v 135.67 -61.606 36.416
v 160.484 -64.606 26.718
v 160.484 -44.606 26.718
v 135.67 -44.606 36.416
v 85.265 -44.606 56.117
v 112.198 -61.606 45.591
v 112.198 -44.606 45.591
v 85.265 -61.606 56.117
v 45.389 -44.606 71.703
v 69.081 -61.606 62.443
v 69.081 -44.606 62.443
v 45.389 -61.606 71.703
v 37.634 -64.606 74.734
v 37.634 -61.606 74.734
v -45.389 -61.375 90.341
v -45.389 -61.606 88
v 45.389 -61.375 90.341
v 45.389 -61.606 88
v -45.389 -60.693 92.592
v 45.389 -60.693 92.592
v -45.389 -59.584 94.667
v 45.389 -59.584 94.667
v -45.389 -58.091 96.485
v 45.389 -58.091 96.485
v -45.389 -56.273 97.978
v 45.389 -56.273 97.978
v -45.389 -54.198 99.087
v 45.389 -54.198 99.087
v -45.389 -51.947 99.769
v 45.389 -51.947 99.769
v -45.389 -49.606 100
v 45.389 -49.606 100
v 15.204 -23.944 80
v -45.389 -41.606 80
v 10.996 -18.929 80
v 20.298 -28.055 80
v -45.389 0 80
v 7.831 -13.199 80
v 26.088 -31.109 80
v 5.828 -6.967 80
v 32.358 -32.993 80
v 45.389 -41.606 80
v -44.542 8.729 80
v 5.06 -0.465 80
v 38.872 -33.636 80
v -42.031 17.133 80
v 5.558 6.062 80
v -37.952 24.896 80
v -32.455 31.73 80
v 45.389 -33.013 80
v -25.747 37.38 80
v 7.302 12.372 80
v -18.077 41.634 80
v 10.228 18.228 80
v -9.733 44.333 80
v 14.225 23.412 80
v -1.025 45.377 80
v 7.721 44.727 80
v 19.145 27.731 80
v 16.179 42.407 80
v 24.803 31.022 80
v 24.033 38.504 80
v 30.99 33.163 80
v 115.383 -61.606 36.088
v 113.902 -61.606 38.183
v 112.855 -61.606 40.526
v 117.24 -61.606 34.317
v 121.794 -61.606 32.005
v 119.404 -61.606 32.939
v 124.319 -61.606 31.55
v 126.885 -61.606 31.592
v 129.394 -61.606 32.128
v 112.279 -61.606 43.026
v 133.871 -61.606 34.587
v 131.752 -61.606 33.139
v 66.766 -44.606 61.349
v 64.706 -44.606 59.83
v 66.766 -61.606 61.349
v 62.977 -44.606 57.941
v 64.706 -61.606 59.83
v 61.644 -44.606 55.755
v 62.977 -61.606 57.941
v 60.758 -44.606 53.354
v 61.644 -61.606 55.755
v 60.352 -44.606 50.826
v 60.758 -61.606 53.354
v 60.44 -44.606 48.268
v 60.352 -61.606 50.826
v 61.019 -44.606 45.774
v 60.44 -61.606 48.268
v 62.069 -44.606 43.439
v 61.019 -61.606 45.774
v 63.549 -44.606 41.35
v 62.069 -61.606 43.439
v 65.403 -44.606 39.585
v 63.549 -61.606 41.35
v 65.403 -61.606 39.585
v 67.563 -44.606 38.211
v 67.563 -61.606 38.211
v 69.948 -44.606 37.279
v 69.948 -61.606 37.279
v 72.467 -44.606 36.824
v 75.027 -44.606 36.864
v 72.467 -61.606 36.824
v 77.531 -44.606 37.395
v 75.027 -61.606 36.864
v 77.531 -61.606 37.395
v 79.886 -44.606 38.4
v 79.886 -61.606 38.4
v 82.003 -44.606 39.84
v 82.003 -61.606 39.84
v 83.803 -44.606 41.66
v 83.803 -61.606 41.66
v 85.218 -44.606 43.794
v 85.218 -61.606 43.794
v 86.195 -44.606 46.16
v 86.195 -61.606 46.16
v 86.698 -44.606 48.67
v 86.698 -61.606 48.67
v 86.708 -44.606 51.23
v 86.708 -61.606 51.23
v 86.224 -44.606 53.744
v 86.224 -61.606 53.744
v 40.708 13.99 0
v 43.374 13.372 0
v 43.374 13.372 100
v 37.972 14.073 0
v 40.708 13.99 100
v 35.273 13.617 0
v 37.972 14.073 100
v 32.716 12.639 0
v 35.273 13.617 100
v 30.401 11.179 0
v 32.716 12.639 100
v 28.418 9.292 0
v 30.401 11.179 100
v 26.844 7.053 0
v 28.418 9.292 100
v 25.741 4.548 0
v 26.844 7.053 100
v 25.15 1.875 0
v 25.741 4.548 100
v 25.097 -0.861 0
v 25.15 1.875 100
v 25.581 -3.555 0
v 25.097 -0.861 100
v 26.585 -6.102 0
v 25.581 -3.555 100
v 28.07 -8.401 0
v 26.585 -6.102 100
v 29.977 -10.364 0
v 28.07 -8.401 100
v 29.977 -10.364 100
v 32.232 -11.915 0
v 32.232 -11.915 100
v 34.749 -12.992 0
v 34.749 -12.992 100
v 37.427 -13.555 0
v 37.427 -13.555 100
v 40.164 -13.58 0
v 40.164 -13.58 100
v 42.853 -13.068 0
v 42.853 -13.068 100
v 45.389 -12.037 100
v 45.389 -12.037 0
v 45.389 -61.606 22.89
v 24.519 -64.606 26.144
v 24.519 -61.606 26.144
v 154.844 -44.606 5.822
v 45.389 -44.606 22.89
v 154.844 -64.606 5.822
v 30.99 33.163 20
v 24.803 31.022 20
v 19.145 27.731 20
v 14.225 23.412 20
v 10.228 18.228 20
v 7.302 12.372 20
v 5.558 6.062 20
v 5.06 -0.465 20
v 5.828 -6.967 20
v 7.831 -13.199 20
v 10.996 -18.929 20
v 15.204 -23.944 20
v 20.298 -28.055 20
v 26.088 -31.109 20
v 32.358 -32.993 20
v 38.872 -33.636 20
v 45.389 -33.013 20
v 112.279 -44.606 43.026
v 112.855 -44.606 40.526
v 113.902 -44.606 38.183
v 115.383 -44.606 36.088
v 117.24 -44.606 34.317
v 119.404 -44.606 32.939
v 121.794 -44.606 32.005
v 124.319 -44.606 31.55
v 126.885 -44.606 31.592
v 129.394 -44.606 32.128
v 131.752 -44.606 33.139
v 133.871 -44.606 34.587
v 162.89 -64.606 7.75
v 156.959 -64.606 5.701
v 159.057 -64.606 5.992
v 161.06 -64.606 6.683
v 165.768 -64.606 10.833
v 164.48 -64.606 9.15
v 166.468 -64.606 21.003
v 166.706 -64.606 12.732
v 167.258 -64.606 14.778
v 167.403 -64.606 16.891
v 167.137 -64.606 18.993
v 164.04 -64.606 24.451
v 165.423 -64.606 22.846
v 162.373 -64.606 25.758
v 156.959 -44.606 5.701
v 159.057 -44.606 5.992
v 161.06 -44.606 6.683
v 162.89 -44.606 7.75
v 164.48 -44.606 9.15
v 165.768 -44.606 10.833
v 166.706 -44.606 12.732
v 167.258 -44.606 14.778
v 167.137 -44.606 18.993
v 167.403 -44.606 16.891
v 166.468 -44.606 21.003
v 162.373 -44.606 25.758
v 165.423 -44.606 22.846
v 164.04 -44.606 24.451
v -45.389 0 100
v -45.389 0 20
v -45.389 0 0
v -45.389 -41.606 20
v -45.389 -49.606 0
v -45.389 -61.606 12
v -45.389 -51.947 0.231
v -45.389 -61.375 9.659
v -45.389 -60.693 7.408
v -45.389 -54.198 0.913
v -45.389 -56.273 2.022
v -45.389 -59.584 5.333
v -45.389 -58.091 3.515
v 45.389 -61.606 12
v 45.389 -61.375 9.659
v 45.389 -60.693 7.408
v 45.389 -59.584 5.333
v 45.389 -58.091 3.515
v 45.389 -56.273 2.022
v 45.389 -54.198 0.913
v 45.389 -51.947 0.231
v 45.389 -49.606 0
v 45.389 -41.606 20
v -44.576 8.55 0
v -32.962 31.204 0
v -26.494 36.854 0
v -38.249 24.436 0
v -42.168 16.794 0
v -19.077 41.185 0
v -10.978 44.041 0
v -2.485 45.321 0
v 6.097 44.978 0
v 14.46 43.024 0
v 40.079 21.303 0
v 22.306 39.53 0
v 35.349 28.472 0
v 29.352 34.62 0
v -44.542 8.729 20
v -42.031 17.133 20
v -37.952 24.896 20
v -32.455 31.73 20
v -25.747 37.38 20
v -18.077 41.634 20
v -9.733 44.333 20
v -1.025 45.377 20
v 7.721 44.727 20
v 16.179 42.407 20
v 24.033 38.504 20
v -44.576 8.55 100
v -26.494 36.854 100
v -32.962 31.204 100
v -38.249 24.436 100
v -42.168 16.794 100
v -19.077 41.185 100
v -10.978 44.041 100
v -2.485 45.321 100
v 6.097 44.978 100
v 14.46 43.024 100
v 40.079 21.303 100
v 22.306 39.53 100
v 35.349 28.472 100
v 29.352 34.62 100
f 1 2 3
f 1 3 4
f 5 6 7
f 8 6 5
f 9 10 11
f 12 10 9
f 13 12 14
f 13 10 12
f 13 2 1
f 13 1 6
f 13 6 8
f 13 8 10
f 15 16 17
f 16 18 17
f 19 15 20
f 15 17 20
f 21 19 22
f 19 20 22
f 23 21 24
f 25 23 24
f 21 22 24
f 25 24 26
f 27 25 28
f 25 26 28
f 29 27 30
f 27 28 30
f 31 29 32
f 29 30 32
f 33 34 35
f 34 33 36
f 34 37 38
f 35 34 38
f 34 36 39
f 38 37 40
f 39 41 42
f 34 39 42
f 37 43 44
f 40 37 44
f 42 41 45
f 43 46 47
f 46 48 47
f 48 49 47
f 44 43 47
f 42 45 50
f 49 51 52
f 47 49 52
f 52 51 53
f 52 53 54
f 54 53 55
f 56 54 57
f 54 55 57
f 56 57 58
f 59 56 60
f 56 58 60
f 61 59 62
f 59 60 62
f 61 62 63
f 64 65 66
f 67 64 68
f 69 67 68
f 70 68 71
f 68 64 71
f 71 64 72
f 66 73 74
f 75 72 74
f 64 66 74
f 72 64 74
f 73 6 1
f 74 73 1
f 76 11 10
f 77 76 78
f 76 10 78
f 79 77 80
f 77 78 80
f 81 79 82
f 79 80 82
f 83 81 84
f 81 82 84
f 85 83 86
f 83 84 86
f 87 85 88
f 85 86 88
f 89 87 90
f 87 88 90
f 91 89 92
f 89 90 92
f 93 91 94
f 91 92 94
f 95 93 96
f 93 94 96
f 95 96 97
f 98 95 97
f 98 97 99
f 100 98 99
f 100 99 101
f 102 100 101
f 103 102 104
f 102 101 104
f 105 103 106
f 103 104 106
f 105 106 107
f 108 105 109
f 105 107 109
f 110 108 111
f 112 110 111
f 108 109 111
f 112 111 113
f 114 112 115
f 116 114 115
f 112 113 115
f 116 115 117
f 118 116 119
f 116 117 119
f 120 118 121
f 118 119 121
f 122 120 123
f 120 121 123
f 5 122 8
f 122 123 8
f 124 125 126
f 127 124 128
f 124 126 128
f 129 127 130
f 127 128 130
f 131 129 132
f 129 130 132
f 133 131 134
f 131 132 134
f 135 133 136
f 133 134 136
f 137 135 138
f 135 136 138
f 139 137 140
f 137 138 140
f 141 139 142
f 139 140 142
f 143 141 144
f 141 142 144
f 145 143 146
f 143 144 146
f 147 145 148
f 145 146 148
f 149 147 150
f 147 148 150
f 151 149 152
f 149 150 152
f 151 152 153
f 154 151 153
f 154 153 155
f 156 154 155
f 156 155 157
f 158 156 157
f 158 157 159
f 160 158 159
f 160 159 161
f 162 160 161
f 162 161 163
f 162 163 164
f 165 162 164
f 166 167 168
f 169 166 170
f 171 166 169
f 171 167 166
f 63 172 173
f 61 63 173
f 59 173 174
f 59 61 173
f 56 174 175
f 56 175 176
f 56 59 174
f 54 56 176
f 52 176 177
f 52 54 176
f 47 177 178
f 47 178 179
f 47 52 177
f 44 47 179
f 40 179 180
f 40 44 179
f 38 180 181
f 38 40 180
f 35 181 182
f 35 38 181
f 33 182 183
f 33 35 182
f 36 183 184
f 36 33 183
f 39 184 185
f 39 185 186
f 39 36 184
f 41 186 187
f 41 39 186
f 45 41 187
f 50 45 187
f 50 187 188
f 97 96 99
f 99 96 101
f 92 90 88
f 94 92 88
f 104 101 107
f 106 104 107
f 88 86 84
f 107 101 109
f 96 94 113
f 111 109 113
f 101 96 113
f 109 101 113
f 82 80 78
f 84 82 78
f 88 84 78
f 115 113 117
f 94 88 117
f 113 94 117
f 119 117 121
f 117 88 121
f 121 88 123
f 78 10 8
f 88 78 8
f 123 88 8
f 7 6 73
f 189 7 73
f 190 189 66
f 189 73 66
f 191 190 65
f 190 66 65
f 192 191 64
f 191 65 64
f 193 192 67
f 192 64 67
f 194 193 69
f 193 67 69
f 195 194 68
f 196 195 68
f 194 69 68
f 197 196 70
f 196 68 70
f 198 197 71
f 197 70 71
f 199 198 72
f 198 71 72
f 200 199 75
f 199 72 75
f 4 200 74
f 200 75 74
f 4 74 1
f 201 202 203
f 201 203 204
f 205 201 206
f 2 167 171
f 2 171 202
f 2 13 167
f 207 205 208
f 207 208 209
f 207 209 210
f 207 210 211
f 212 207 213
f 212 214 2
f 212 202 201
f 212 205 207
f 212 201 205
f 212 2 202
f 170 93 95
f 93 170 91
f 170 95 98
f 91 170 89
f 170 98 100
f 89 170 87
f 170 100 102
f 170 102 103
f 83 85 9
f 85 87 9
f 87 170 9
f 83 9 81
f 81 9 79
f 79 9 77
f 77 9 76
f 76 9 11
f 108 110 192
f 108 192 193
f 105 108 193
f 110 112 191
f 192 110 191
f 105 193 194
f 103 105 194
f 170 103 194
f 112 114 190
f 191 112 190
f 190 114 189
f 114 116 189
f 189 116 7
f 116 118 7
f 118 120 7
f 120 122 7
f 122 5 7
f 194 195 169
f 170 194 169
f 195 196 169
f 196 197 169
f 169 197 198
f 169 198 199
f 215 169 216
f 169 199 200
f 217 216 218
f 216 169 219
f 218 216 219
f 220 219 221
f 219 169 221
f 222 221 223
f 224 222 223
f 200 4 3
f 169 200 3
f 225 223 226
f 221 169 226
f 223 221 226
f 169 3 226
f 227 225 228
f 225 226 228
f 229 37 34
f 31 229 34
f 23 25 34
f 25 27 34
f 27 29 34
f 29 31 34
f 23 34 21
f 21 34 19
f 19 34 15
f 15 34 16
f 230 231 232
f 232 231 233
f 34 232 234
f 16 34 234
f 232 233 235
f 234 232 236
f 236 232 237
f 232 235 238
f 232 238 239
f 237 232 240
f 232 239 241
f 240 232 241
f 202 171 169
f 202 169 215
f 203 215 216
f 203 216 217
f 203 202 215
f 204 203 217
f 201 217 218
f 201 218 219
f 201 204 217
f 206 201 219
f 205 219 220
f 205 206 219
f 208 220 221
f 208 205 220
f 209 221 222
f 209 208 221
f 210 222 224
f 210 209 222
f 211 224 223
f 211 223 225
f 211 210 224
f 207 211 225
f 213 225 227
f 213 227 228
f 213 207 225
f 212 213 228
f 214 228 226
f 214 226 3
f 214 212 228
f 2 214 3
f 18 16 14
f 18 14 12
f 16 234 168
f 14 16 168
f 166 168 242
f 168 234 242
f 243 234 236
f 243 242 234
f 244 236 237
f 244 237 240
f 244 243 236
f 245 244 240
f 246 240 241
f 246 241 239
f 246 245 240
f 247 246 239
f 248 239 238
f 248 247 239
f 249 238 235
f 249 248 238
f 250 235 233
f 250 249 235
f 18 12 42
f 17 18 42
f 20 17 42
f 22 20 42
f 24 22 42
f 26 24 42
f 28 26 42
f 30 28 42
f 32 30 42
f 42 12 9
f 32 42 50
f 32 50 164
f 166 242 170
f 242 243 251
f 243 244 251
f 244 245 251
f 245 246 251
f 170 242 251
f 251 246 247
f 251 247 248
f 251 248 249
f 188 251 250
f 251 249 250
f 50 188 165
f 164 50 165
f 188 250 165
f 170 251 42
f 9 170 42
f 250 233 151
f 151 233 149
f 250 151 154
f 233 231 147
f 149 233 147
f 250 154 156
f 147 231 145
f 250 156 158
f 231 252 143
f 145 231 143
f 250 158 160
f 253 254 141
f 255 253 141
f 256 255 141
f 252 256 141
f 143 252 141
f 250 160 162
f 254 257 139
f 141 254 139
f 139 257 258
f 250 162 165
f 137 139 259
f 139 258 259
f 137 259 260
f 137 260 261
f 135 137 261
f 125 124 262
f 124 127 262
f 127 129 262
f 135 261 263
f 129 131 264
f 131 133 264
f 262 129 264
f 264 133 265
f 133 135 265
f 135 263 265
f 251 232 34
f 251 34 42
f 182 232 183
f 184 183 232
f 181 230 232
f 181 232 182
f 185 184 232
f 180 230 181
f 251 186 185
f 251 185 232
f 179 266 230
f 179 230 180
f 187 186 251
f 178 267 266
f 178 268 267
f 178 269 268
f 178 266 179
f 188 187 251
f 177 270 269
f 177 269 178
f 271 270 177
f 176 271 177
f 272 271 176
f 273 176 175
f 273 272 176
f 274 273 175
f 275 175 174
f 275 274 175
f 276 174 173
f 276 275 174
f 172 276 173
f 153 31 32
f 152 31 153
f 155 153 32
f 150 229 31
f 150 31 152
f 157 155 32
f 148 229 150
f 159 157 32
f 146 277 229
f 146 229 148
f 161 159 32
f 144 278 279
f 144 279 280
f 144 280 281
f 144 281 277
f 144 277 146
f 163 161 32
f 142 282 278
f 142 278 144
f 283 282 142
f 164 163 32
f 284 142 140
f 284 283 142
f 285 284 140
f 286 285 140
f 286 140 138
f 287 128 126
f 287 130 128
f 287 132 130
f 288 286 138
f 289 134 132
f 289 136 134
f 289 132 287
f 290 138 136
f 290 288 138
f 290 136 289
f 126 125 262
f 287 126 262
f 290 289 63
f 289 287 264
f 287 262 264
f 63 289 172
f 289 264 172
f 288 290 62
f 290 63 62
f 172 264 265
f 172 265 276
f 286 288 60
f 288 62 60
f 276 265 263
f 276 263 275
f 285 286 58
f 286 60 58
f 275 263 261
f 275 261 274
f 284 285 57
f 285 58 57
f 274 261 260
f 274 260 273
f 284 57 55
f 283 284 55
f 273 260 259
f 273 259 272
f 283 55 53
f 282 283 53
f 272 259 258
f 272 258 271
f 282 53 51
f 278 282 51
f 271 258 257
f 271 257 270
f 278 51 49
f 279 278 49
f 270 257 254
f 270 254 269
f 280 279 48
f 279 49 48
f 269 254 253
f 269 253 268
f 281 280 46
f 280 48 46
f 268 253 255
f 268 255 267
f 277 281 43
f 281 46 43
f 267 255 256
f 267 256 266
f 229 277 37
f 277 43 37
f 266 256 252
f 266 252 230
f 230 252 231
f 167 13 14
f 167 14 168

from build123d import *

# Parameters (mm, degrees)
U_SHAPE_DEPTH        = 100
SKETCH8_R            = 13.870670921
INNER_HOLE_DEPTH     = 126.918394305
THICKNESS_T          = -20
FILLET_2_R           = 12
TONGUE_DEPTH         = 20
SKETCH9_R            = 13.219756801
MOUNTING_HOLES_DEPTH = 223.42572915


with BuildPart() as part:
    # Sketch4 → "U" shape (new body)
    with BuildSketch(Plane.XY):
        with BuildLine():
            Line((-45.388843922, 0), (-45.388843922, -61.60596458))
            Line((-45.388843922, -61.60596458), (45.388843922, -61.60596458))
            Line((45.388843922, -61.60596458), (45.388843922, 0))
            ThreePointArc((45.388843922, 0), (0, 45.388843922), (-45.388843922, 0))
        make_face()
    extrude(amount=U_SHAPE_DEPTH)

    # Sketch8 → Inner Hole (cut, through all)
    with BuildSketch(Plane.XY.offset(100)):
        with Locations((38.923783738, 0.23491683)):
            Circle(SKETCH8_R)
    extrude(amount=-INNER_HOLE_DEPTH, mode=Mode.SUBTRACT)

    # Thickness
    thickness_openings = [part.faces().sort_by_distance(p)[0] for p in [
        (45.388843922, -36.821453076, 50),
        (-45.388843922, -30.80298229, 50),
        (-6.761547736, 44.882386576, 50),
    ]]
    offset(amount=THICKNESS_T, openings=thickness_openings, kind=Kind.INTERSECTION)

    # Fillet 2
    fillet_2_edges = [part.edges().sort_by_distance(p)[0] for p in [
        (0, -61.60596458, 100),
        (0, -61.60596458, 0),
    ]]
    fillet(fillet_2_edges, radius=FILLET_2_R)

    # Sketch7 → Tongue (add)
    with BuildSketch(Plane.XZ.offset(64.60596458)):
        with BuildLine():
            Line((24.518796564, 26.143873614), (154.843931452, 5.821988173))
            ThreePointArc((154.843931452, 5.821988173), (167.031484247, 13.741465613), (160.484216098, 26.717899862))
            Line((160.484216098, 26.717899862), (37.634315602, 74.733748908))
            Line((37.634315602, 74.733748908), (24.518796564, 26.143873614))
        make_face()
    extrude(amount=-TONGUE_DEPTH)

    # Sketch9 → Mounting Holes (cut, through all)
    with BuildSketch(Plane.XZ.offset(61.60596458)):
        with Locations((73.545474364, 50)):
            Circle(SKETCH9_R)
        with Locations((125.389042853, 44.726843721)):
            Circle(SKETCH9_R)
    extrude(amount=-MOUNTING_HOLES_DEPTH, mode=Mode.SUBTRACT)


solid = part.part
